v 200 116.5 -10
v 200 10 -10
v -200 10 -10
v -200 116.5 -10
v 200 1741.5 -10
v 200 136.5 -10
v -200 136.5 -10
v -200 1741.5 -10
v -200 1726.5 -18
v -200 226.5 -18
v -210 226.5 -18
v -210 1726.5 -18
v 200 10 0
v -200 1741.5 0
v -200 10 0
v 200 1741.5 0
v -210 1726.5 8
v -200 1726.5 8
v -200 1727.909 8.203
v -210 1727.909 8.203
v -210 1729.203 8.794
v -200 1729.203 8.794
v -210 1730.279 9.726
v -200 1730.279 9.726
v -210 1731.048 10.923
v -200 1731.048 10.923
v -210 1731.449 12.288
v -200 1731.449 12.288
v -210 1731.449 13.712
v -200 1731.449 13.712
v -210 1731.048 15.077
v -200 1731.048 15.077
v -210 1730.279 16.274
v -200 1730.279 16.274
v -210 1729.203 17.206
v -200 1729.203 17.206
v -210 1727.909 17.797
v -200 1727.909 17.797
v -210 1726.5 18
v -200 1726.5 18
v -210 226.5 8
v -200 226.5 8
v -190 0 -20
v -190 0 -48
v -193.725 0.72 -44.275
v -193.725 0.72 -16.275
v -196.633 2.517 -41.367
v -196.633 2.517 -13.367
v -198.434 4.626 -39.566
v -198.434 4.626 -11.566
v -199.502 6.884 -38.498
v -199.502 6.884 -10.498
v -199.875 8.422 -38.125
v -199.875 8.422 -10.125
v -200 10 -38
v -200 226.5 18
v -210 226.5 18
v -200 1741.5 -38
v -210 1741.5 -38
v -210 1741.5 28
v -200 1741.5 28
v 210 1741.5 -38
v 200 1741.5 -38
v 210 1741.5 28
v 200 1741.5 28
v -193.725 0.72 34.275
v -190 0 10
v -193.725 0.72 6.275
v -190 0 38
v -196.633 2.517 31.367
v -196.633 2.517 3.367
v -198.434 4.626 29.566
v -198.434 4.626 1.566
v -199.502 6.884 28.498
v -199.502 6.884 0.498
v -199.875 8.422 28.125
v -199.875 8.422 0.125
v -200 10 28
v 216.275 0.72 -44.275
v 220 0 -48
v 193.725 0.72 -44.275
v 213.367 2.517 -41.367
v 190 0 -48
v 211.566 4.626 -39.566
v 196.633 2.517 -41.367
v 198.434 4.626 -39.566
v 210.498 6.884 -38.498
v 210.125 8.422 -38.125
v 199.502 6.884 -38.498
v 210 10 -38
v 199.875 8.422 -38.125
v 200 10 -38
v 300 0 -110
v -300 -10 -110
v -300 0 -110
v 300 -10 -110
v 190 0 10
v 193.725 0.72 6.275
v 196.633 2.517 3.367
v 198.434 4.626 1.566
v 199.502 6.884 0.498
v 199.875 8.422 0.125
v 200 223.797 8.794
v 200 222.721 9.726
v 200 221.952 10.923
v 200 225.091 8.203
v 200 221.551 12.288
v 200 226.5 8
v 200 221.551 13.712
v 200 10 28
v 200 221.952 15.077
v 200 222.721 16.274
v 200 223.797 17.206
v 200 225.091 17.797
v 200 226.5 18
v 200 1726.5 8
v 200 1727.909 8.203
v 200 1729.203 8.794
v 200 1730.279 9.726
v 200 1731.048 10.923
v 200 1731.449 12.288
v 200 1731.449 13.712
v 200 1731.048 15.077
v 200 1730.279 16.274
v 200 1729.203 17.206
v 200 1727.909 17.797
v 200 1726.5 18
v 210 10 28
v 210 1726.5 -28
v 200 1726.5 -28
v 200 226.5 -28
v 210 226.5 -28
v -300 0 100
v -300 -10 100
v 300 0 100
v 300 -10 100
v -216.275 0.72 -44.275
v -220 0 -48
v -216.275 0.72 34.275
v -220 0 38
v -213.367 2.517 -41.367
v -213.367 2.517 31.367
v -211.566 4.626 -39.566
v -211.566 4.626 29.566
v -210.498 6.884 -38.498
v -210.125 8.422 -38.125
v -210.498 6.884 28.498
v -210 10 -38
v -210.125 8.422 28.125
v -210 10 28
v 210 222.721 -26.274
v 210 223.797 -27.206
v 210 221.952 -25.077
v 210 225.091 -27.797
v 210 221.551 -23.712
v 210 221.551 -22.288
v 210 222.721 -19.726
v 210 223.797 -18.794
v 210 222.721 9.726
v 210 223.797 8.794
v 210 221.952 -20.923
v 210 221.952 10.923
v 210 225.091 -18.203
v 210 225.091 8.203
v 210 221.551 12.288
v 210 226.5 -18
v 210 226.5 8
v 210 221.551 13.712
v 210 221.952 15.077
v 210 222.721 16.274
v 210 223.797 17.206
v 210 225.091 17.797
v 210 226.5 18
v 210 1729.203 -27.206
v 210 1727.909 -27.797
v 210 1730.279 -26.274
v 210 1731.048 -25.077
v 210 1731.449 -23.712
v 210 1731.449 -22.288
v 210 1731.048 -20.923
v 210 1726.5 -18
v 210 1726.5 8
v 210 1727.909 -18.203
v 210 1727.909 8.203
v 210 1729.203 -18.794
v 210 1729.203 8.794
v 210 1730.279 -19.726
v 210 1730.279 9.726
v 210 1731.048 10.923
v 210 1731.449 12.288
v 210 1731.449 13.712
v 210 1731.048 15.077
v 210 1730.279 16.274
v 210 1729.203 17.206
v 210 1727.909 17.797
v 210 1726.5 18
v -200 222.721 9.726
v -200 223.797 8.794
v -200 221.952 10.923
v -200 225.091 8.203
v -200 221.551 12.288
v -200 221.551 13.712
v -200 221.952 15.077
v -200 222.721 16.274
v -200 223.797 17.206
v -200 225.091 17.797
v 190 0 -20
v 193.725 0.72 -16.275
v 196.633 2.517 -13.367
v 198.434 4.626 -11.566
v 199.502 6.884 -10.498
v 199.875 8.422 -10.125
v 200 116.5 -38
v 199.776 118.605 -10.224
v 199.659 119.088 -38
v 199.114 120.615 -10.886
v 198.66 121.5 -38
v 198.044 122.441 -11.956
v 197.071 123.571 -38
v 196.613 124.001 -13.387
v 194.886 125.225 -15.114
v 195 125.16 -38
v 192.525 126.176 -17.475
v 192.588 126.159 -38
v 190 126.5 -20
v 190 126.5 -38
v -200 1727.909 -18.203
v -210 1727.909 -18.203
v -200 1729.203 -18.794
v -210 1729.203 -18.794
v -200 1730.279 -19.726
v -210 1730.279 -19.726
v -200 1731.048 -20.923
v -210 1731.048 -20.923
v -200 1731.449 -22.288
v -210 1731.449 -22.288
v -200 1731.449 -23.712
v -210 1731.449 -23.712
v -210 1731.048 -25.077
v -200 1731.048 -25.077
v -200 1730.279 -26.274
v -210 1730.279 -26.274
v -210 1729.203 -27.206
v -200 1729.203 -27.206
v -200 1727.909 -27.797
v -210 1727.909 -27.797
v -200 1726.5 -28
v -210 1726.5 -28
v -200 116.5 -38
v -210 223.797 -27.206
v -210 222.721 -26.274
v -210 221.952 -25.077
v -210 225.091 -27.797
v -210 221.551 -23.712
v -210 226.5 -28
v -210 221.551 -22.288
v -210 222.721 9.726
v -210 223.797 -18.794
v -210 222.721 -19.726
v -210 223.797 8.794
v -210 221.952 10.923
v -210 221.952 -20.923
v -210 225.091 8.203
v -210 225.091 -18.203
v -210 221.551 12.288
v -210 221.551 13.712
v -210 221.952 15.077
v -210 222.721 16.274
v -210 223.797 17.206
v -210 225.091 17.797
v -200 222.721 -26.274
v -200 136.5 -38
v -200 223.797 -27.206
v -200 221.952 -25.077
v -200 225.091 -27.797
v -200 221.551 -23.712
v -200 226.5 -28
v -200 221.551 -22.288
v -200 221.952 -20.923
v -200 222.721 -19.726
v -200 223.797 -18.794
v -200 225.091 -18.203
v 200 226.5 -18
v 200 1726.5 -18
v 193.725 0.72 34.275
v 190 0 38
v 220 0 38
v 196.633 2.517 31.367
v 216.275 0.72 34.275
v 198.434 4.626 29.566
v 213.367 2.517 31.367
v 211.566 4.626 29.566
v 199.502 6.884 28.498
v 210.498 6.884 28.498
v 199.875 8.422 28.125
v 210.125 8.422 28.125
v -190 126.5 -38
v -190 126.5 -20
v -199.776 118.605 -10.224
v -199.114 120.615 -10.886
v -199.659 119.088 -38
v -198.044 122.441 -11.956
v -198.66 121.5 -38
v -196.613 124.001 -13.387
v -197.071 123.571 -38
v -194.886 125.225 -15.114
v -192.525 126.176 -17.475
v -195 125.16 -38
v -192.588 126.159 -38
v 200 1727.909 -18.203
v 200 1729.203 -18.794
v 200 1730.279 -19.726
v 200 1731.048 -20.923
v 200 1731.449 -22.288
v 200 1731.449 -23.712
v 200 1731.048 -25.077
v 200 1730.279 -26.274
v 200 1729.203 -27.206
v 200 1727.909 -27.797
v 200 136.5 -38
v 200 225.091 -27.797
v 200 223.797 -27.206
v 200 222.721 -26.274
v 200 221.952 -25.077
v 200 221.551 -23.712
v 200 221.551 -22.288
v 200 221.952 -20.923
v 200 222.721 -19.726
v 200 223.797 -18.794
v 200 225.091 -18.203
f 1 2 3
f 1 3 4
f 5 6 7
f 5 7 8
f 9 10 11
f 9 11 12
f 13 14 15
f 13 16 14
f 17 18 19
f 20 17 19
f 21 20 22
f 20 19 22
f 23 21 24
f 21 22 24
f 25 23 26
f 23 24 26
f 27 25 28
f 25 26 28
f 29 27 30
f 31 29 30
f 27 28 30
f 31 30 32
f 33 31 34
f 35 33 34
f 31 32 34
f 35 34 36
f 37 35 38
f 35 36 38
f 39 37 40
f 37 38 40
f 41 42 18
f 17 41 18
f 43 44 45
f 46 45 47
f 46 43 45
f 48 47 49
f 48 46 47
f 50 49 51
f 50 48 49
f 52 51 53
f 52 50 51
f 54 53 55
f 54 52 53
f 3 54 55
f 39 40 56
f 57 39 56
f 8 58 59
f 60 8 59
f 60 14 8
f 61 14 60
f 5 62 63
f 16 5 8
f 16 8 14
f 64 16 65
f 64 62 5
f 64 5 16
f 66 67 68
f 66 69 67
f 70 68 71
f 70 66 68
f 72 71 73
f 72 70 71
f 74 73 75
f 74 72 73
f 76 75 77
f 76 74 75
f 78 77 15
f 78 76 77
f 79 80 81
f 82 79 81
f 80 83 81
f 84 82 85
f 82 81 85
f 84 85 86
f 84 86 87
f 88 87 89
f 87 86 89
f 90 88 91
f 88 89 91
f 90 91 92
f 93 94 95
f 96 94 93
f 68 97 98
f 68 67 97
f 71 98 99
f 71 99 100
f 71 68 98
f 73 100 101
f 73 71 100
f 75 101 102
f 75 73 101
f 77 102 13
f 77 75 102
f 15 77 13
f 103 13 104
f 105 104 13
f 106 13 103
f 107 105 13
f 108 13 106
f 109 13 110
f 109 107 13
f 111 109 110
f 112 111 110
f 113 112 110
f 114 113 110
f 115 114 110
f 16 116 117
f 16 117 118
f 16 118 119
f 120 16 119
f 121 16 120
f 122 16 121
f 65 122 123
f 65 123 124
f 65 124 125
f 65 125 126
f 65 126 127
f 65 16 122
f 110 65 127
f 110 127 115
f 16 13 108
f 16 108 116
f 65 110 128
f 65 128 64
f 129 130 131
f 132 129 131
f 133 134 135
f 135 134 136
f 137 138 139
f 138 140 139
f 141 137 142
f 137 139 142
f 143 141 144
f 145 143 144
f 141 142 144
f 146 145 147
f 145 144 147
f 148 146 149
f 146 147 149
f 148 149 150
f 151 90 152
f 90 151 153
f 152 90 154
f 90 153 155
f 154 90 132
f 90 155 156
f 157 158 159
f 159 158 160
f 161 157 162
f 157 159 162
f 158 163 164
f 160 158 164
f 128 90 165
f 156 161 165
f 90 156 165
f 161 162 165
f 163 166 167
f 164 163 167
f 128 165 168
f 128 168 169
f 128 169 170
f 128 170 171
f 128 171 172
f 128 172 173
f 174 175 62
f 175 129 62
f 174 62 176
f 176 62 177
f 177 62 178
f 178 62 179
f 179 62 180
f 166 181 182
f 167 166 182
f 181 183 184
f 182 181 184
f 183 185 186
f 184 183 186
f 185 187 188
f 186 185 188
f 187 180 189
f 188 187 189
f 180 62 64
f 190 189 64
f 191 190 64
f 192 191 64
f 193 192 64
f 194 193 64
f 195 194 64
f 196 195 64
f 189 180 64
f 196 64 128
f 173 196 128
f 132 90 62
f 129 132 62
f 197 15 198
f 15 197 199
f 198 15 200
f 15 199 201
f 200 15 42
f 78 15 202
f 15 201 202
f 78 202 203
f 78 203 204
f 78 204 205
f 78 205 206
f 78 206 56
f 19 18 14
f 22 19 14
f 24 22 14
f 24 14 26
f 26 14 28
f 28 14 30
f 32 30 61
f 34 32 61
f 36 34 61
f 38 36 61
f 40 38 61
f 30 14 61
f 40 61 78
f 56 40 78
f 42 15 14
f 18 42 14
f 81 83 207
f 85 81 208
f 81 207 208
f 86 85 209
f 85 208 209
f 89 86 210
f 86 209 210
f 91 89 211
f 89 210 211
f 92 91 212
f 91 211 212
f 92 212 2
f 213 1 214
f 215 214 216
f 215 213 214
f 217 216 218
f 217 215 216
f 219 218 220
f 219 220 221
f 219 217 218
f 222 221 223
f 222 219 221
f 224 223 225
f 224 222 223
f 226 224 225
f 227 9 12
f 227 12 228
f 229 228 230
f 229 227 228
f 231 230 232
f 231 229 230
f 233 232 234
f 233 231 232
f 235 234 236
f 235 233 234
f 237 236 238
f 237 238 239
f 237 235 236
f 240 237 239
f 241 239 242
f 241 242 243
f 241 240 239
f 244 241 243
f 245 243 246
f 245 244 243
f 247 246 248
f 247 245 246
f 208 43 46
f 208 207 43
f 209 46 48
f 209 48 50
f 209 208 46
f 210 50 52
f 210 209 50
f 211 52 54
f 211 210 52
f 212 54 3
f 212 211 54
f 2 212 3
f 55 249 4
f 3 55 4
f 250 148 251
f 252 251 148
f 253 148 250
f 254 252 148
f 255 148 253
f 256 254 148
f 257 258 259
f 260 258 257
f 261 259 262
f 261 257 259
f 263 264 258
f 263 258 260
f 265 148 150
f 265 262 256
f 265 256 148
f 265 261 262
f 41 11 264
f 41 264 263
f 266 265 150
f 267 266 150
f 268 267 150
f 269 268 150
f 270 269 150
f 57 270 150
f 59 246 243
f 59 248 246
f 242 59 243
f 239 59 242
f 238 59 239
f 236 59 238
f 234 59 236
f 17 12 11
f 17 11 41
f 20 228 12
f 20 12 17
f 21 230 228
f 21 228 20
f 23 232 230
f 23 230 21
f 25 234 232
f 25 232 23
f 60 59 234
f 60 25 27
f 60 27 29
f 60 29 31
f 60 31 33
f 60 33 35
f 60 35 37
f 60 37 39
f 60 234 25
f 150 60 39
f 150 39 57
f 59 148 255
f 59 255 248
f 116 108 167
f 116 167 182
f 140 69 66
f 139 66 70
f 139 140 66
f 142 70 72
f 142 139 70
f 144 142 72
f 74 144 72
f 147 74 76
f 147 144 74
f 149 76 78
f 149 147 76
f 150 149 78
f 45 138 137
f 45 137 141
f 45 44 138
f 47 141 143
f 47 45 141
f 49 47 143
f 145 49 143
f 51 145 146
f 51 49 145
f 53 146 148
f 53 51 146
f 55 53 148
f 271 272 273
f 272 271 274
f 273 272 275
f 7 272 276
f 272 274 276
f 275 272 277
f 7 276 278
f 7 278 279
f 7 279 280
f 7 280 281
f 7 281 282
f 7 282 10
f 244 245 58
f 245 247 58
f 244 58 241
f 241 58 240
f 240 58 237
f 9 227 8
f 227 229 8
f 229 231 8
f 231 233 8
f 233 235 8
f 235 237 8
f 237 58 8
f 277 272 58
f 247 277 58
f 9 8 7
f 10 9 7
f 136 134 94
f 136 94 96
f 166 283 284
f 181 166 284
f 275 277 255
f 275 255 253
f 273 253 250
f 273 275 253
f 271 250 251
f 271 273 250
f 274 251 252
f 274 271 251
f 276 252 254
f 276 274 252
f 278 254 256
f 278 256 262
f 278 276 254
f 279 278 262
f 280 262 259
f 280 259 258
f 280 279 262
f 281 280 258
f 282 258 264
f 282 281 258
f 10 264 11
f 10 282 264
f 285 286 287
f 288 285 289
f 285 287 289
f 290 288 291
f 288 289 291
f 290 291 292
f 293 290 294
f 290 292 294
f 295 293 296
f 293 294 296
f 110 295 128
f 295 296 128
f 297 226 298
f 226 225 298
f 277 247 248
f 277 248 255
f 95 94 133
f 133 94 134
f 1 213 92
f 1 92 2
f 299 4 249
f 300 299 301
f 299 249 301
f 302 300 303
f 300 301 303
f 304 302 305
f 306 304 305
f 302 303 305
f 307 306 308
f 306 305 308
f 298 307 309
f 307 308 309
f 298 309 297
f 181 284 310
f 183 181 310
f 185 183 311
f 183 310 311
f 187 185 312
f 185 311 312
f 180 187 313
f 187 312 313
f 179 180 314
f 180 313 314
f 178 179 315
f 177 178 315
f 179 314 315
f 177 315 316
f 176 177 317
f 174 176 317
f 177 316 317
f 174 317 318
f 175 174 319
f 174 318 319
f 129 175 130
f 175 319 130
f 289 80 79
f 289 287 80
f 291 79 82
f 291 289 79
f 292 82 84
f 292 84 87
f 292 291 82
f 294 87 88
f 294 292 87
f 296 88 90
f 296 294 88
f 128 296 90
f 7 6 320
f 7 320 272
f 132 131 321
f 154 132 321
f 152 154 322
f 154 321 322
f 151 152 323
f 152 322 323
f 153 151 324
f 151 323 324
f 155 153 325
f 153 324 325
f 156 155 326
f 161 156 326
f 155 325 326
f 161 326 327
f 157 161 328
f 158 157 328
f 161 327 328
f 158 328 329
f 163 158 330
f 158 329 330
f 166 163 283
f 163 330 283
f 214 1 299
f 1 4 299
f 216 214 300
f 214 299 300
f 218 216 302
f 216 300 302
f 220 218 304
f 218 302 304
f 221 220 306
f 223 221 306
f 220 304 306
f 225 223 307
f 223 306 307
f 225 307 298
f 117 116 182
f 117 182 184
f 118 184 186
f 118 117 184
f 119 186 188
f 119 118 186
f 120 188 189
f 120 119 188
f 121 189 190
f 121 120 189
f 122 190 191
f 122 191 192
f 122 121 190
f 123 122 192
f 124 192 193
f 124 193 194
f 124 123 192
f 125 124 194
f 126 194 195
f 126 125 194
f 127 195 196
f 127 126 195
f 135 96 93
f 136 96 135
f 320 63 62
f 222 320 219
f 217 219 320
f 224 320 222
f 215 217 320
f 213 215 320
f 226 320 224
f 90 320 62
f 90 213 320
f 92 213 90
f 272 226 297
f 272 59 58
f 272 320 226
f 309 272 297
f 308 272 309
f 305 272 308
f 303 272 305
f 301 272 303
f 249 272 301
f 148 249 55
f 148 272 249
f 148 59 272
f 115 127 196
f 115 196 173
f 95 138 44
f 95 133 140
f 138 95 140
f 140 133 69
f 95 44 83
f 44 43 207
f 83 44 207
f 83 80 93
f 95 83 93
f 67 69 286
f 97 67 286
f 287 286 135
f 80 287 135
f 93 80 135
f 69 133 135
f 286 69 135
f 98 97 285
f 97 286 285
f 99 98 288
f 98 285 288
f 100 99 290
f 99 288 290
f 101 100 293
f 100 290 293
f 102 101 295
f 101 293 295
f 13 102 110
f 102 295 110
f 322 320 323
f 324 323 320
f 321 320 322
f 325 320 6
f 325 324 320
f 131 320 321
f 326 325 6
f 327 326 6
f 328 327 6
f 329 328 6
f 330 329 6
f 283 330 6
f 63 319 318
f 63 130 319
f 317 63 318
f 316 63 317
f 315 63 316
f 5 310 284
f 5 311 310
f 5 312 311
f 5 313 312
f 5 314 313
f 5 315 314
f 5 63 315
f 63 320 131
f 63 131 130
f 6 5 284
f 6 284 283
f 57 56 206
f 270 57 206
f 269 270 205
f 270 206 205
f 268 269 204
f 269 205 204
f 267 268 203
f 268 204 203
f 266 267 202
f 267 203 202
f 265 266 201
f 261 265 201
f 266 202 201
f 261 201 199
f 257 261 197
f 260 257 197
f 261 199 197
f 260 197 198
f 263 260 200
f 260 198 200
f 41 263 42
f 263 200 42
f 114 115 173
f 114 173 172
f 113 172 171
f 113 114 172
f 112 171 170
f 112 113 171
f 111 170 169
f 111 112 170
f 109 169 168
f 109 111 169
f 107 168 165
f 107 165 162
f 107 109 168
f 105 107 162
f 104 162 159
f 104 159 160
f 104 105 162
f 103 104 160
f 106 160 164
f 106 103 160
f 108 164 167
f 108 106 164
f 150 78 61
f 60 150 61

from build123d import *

# Parameters (mm, degrees)
WALL_EXTRUDE_DEPTH           = 200
RIGHT_GUIDE_EXTRUDE_DEPTH    = 10
SKETCH3_W                    = 600
SKETCH3_H                    = 210
BOTTOM_FOOT_COMPLETION_DEPTH = 10
SKETCH4_W                    = 400
SKETCH4_H                    = 10
PLATFORM_STOPPER_DEPTH       = 28
STRUCTURAL_FILLETS_R         = 10


with BuildPart() as part:
    # Sketch1 → Wall extrude (new, symmetric)
    with BuildSketch(Plane(origin=(0, 0, 0), x_dir=(0, 0, -1), z_dir=(1, 0, 0))):
        Polygon((0, 0), (-100, 0), (-100, -10), (10, -10), (110, -10), (110, 0), (10, 0), (10, 1741.5), (0, 1741.5), align=None)
    extrude(amount=WALL_EXTRUDE_DEPTH, both=True)

    # Sketch2 → Right guide extrude (add)
    with BuildSketch(Plane(origin=(200, 0, 0), x_dir=(0, 0, -1), z_dir=(1, 0, 0))):
        Polygon((0, 1741.5), (38, 1741.5), (38, -10), (0, -10), (-28, -10), (-28, 1741.5), align=None)
        with BuildLine():
            Line((18, 226.5), (18, 1726.5))
            ThreePointArc((18, 1726.5), (23, 1731.5), (28, 1726.5))
            Line((28, 1726.5), (28, 226.5))
            ThreePointArc((28, 226.5), (23, 221.5), (18, 226.5))
        make_face(mode=Mode.SUBTRACT)
        with BuildLine():
            Line((-18, 1726.5), (-18, 226.5))
            ThreePointArc((-18, 226.5), (-13, 221.5), (-8, 226.5))
            Line((-8, 226.5), (-8, 1726.5))
            ThreePointArc((-8, 1726.5), (-13, 1731.5), (-18, 1726.5))
        make_face(mode=Mode.SUBTRACT)
    right_guide_extrude = extrude(amount=RIGHT_GUIDE_EXTRUDE_DEPTH)

    # Left guide extrude: Right guide extrude across plane
    add(right_guide_extrude.mirror(Plane(origin=(0, 0, 0), x_dir=(0, 0, 1), z_dir=(1, 0, 0))))

    # Sketch3 → Bottom foot completion (add)
    with BuildSketch(Plane.XZ.offset(10)):
        with Locations((0, -5)):
            Rectangle(SKETCH3_W, SKETCH3_H)
    extrude(amount=-BOTTOM_FOOT_COMPLETION_DEPTH)

    # Sketch4 → Platform stopper (add)
    with BuildSketch(Plane(origin=(0, 0, -10), x_dir=(-1, 0, 0), z_dir=(0, 0, -1))):
        with Locations((0, 131.5)):
            Rectangle(SKETCH4_W, SKETCH4_H)
    extrude(amount=PLATFORM_STOPPER_DEPTH)

    # Structural fillets
    structural_fillets_edges = [part.edges().sort_by_distance(p)[0] for p in [
        (205, 0, 28),
        (205, 0, -38),
        (210, 0, -5),
        (-205, 0, -38),
        (-210, 0, -5),
        (-205, 0, 28),
        (-200, 0, 14),
        (-200, 126.5, -24),
        (200, 126.5, -24),
        (0, 126.5, -10),
        (0, 0, -10),
        (0, 0, 0),
        (200, 0, -24),
        (-200, 0, -24),
        (200, 0, 14),
    ]]
    fillet(structural_fillets_edges, radius=STRUCTURAL_FILLETS_R)


solid = part.part
